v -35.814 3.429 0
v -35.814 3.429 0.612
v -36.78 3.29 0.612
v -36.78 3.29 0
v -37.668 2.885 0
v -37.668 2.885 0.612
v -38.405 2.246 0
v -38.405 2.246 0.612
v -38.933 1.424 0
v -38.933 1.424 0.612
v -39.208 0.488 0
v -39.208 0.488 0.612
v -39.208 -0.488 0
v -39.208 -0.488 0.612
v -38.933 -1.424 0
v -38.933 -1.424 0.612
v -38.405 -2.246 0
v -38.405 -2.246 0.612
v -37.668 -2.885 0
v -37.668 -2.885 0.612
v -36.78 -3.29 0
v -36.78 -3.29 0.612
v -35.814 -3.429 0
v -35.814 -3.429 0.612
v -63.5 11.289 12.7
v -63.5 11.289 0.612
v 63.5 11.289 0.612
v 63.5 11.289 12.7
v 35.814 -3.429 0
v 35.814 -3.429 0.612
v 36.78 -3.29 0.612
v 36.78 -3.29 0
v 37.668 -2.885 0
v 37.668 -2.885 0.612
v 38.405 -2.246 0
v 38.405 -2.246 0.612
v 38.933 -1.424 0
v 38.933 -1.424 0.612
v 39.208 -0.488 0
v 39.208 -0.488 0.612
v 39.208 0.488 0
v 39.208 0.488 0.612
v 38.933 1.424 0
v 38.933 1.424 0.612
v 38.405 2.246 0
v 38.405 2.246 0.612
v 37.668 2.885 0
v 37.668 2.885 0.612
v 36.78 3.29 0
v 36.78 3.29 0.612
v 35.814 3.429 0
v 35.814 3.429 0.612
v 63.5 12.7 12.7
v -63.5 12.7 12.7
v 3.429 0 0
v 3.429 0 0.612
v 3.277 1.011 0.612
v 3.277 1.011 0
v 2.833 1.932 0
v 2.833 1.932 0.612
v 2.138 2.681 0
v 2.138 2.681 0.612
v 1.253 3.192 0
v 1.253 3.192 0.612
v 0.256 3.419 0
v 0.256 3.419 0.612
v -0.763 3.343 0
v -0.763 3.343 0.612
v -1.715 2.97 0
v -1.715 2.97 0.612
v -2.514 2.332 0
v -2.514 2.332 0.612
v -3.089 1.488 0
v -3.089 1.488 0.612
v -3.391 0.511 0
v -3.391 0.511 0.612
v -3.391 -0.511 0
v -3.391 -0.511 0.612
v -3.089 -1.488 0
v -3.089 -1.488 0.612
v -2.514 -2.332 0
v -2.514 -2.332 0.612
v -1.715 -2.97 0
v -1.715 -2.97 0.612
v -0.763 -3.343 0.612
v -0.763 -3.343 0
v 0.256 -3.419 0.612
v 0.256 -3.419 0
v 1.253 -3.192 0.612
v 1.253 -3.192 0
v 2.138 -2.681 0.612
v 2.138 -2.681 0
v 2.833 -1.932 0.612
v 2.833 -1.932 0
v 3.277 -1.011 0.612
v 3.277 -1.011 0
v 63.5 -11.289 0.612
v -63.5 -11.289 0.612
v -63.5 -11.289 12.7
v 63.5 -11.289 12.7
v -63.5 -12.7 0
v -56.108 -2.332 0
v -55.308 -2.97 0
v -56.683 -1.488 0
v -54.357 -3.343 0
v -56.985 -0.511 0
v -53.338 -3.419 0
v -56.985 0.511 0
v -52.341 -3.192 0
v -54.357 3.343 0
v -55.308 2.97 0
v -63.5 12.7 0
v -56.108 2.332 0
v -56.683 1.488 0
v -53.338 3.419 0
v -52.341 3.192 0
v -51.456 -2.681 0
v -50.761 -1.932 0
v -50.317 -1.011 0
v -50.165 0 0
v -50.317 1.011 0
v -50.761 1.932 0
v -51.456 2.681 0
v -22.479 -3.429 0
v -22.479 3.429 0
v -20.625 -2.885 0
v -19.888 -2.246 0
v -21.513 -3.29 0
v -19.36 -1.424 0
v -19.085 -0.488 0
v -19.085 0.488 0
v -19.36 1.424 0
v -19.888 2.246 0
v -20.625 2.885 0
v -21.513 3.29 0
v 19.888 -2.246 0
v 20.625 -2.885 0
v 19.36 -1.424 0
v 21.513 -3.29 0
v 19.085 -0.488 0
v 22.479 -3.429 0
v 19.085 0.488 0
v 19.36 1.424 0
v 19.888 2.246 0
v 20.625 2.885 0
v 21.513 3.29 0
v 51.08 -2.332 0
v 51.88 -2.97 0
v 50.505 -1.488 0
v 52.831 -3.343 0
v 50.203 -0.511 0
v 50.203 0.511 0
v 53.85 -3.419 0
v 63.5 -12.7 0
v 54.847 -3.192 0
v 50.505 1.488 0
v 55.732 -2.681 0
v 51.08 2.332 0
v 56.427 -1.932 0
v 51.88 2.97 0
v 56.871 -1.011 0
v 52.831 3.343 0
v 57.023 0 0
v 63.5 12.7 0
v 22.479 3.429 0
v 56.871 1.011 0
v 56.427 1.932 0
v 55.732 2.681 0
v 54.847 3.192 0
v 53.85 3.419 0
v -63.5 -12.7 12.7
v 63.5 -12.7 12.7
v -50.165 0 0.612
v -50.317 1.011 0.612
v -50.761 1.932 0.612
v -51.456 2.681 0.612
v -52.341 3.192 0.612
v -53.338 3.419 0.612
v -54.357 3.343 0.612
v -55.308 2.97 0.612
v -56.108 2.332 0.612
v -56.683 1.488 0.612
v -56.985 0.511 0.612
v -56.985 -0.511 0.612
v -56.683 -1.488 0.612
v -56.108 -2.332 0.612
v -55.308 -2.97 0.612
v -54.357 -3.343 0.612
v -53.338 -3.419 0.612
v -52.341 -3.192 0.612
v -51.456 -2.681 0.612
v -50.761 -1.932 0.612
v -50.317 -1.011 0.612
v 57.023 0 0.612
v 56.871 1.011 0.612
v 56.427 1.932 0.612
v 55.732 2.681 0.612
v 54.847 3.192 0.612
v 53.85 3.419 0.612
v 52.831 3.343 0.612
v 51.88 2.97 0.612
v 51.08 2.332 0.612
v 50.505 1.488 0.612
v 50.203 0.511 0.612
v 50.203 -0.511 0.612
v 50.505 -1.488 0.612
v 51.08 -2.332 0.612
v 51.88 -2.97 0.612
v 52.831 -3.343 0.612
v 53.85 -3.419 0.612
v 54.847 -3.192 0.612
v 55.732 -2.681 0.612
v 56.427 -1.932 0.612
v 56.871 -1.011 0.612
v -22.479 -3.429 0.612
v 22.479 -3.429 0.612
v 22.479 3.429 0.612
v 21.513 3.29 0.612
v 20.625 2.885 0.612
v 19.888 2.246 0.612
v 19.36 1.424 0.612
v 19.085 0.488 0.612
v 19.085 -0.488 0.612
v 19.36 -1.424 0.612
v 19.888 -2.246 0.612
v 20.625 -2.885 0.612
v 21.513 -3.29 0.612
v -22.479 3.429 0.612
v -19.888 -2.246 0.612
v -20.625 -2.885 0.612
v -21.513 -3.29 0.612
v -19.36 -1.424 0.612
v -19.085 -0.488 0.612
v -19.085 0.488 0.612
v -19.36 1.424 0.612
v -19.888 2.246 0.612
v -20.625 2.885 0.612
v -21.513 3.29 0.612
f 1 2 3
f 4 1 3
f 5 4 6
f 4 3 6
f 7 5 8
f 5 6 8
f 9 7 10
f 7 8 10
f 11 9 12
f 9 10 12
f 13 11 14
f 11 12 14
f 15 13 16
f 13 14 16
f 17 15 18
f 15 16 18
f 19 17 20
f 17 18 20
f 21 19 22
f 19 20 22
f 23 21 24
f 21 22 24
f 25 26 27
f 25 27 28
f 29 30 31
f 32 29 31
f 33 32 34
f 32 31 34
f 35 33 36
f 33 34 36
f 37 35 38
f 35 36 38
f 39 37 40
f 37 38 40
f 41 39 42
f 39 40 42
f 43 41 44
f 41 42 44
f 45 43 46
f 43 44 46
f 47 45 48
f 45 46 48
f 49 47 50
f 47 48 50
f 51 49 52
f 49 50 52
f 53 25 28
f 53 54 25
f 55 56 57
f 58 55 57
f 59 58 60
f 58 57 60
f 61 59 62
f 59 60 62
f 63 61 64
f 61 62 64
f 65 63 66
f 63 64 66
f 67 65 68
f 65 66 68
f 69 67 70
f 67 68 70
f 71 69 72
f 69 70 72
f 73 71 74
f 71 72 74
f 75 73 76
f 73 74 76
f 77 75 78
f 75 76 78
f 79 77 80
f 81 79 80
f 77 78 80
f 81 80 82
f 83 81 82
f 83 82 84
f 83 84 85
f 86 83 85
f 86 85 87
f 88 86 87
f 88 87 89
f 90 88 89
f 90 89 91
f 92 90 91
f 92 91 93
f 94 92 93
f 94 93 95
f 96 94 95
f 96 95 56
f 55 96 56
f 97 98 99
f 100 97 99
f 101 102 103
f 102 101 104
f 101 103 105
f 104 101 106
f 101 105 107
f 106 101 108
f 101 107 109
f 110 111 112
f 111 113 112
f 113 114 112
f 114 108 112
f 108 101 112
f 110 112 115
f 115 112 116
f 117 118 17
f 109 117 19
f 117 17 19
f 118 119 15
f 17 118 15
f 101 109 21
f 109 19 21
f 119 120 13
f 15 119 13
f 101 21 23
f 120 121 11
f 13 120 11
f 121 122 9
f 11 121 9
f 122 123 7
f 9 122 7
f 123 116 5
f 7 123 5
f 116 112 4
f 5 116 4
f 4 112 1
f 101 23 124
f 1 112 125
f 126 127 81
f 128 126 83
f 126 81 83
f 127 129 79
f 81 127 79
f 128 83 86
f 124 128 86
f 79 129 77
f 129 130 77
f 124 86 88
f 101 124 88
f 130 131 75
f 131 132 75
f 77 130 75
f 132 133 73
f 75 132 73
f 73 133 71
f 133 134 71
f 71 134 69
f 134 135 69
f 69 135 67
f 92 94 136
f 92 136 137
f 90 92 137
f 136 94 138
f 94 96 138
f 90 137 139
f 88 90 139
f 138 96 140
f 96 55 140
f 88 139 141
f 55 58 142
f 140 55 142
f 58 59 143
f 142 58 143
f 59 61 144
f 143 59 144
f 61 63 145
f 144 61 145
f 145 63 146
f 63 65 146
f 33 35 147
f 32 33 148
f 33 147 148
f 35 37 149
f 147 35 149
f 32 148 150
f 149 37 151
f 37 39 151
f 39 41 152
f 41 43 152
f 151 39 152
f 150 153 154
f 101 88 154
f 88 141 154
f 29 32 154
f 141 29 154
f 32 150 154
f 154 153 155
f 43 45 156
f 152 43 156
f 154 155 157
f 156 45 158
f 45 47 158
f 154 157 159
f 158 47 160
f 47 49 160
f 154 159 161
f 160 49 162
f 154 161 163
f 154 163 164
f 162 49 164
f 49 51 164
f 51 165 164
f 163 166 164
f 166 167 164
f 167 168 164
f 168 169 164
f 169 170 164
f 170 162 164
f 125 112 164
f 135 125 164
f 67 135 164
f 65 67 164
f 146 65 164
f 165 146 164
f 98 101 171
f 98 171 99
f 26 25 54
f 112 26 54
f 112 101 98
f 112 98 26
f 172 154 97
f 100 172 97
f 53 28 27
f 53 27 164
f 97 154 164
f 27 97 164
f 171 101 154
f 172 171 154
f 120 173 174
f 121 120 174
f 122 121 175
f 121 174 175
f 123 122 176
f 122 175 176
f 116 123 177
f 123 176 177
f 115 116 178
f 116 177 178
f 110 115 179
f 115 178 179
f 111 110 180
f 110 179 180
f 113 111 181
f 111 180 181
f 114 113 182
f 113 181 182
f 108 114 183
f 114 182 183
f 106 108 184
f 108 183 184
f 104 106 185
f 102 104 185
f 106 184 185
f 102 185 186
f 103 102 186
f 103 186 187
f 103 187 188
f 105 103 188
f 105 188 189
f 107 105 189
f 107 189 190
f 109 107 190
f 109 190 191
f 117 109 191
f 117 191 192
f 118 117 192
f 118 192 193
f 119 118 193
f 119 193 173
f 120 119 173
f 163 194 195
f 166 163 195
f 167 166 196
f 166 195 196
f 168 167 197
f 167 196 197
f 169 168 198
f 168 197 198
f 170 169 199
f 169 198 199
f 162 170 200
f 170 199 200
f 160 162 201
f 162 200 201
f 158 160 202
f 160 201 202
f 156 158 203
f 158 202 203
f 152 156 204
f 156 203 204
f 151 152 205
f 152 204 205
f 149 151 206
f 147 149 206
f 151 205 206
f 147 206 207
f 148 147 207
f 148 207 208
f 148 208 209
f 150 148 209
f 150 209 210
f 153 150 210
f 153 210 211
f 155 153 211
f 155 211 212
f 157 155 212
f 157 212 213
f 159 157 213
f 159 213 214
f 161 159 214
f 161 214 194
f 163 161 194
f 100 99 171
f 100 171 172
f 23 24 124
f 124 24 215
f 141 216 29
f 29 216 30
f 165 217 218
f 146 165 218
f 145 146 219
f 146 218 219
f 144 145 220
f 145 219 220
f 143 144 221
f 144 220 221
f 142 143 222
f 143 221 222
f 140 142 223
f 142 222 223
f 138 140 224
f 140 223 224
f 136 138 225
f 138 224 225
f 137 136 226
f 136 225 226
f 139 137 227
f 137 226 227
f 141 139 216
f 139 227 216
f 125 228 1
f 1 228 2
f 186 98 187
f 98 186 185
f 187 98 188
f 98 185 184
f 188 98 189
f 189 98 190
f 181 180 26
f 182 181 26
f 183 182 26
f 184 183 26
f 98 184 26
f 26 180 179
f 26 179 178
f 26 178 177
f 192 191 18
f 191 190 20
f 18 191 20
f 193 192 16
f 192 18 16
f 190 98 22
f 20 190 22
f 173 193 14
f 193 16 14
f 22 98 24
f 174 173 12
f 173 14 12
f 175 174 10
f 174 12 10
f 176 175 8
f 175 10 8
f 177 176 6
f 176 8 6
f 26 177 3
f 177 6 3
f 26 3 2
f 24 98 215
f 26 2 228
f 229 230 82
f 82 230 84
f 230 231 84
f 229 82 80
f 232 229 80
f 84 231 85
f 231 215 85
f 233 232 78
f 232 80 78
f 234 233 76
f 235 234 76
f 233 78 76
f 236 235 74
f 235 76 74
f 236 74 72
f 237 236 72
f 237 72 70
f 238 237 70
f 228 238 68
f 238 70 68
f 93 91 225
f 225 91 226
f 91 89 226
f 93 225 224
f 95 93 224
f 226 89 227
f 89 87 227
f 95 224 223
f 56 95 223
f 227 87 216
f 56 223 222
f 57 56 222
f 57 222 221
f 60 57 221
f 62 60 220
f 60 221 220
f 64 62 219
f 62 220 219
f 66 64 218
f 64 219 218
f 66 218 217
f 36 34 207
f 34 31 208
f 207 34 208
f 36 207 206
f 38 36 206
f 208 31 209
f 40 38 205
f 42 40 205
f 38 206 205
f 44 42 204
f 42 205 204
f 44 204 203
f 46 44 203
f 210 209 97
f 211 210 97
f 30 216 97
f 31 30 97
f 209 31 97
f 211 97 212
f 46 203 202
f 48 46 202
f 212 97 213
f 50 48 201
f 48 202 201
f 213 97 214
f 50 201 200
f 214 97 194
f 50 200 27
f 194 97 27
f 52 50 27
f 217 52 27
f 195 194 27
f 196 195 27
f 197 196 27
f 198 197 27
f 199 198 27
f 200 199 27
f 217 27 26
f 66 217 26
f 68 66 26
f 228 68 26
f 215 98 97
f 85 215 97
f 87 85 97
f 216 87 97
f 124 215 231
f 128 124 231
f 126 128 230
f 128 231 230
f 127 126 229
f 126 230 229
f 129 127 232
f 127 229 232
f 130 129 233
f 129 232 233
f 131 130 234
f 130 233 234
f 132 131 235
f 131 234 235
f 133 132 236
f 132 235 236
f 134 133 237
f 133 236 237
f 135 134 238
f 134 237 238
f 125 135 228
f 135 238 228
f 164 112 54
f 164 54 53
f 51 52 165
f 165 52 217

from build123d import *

# Parameters (mm, degrees)
F0_W          = 127
F0_H          = 25.4
F1_DEPTH      = 0.762
F2_DEPTH      = 12.7
F3_W          = 22.5780475885
F3_H          = 24.1802637465
F4_DEPTH      = 101.6
F4_DEPTH_BACK = 101.6
F5_R          = 3.429
F6_DEPTH      = 25.4


with BuildPart() as f1:
    # F0 (on Top) → F1 (new body)
    with BuildSketch(Plane.XY):
        Rectangle(F0_W, F0_H)
    extrude(amount=F1_DEPTH)

    # F0 (on Top) → F2 (join)
    with BuildSketch(Plane.XY):
        Rectangle(F0_W, F0_H)
    extrude(amount=F2_DEPTH)

    # F3 (on Right) → F4 (cut, two sides)
    with BuildSketch(Plane.YZ) as f4_sk:
        with Locations((0, 12.7019658685)):
            Rectangle(F3_W, F3_H)
    extrude(amount=-F4_DEPTH, mode=Mode.SUBTRACT)
    extrude(f4_sk.sketch, amount=F4_DEPTH_BACK, mode=Mode.SUBTRACT)

    # F5 (on face) → F6 (cut)
    with BuildSketch(Plane.XY.offset(0.6118339952)):
        Circle(F5_R)
        with Locations((-53.594, 0)):
            Circle(F5_R)
        with BuildLine():
            Line((-22.479, 3.429), (-35.814, 3.429))
            ThreePointArc((-35.814, 3.429), (-39.243, 0), (-35.814, -3.429))
            Line((-35.814, -3.429), (-22.479, -3.429))
            ThreePointArc((-22.479, -3.429), (-19.05, 0), (-22.479, 3.429))
        make_face()
        with BuildLine():
            ThreePointArc((35.814, -3.429), (39.243, 0), (35.814, 3.429))
            Line((35.814, 3.429), (22.479, 3.429))
            ThreePointArc((22.479, 3.429), (19.05, 0), (22.479, -3.429))
            Line((22.479, -3.429), (35.814, -3.429))
        make_face()
        with Locations((53.594, 0)):
            Circle(F5_R)
    extrude(amount=-F6_DEPTH, mode=Mode.SUBTRACT)


solid = f1.part
